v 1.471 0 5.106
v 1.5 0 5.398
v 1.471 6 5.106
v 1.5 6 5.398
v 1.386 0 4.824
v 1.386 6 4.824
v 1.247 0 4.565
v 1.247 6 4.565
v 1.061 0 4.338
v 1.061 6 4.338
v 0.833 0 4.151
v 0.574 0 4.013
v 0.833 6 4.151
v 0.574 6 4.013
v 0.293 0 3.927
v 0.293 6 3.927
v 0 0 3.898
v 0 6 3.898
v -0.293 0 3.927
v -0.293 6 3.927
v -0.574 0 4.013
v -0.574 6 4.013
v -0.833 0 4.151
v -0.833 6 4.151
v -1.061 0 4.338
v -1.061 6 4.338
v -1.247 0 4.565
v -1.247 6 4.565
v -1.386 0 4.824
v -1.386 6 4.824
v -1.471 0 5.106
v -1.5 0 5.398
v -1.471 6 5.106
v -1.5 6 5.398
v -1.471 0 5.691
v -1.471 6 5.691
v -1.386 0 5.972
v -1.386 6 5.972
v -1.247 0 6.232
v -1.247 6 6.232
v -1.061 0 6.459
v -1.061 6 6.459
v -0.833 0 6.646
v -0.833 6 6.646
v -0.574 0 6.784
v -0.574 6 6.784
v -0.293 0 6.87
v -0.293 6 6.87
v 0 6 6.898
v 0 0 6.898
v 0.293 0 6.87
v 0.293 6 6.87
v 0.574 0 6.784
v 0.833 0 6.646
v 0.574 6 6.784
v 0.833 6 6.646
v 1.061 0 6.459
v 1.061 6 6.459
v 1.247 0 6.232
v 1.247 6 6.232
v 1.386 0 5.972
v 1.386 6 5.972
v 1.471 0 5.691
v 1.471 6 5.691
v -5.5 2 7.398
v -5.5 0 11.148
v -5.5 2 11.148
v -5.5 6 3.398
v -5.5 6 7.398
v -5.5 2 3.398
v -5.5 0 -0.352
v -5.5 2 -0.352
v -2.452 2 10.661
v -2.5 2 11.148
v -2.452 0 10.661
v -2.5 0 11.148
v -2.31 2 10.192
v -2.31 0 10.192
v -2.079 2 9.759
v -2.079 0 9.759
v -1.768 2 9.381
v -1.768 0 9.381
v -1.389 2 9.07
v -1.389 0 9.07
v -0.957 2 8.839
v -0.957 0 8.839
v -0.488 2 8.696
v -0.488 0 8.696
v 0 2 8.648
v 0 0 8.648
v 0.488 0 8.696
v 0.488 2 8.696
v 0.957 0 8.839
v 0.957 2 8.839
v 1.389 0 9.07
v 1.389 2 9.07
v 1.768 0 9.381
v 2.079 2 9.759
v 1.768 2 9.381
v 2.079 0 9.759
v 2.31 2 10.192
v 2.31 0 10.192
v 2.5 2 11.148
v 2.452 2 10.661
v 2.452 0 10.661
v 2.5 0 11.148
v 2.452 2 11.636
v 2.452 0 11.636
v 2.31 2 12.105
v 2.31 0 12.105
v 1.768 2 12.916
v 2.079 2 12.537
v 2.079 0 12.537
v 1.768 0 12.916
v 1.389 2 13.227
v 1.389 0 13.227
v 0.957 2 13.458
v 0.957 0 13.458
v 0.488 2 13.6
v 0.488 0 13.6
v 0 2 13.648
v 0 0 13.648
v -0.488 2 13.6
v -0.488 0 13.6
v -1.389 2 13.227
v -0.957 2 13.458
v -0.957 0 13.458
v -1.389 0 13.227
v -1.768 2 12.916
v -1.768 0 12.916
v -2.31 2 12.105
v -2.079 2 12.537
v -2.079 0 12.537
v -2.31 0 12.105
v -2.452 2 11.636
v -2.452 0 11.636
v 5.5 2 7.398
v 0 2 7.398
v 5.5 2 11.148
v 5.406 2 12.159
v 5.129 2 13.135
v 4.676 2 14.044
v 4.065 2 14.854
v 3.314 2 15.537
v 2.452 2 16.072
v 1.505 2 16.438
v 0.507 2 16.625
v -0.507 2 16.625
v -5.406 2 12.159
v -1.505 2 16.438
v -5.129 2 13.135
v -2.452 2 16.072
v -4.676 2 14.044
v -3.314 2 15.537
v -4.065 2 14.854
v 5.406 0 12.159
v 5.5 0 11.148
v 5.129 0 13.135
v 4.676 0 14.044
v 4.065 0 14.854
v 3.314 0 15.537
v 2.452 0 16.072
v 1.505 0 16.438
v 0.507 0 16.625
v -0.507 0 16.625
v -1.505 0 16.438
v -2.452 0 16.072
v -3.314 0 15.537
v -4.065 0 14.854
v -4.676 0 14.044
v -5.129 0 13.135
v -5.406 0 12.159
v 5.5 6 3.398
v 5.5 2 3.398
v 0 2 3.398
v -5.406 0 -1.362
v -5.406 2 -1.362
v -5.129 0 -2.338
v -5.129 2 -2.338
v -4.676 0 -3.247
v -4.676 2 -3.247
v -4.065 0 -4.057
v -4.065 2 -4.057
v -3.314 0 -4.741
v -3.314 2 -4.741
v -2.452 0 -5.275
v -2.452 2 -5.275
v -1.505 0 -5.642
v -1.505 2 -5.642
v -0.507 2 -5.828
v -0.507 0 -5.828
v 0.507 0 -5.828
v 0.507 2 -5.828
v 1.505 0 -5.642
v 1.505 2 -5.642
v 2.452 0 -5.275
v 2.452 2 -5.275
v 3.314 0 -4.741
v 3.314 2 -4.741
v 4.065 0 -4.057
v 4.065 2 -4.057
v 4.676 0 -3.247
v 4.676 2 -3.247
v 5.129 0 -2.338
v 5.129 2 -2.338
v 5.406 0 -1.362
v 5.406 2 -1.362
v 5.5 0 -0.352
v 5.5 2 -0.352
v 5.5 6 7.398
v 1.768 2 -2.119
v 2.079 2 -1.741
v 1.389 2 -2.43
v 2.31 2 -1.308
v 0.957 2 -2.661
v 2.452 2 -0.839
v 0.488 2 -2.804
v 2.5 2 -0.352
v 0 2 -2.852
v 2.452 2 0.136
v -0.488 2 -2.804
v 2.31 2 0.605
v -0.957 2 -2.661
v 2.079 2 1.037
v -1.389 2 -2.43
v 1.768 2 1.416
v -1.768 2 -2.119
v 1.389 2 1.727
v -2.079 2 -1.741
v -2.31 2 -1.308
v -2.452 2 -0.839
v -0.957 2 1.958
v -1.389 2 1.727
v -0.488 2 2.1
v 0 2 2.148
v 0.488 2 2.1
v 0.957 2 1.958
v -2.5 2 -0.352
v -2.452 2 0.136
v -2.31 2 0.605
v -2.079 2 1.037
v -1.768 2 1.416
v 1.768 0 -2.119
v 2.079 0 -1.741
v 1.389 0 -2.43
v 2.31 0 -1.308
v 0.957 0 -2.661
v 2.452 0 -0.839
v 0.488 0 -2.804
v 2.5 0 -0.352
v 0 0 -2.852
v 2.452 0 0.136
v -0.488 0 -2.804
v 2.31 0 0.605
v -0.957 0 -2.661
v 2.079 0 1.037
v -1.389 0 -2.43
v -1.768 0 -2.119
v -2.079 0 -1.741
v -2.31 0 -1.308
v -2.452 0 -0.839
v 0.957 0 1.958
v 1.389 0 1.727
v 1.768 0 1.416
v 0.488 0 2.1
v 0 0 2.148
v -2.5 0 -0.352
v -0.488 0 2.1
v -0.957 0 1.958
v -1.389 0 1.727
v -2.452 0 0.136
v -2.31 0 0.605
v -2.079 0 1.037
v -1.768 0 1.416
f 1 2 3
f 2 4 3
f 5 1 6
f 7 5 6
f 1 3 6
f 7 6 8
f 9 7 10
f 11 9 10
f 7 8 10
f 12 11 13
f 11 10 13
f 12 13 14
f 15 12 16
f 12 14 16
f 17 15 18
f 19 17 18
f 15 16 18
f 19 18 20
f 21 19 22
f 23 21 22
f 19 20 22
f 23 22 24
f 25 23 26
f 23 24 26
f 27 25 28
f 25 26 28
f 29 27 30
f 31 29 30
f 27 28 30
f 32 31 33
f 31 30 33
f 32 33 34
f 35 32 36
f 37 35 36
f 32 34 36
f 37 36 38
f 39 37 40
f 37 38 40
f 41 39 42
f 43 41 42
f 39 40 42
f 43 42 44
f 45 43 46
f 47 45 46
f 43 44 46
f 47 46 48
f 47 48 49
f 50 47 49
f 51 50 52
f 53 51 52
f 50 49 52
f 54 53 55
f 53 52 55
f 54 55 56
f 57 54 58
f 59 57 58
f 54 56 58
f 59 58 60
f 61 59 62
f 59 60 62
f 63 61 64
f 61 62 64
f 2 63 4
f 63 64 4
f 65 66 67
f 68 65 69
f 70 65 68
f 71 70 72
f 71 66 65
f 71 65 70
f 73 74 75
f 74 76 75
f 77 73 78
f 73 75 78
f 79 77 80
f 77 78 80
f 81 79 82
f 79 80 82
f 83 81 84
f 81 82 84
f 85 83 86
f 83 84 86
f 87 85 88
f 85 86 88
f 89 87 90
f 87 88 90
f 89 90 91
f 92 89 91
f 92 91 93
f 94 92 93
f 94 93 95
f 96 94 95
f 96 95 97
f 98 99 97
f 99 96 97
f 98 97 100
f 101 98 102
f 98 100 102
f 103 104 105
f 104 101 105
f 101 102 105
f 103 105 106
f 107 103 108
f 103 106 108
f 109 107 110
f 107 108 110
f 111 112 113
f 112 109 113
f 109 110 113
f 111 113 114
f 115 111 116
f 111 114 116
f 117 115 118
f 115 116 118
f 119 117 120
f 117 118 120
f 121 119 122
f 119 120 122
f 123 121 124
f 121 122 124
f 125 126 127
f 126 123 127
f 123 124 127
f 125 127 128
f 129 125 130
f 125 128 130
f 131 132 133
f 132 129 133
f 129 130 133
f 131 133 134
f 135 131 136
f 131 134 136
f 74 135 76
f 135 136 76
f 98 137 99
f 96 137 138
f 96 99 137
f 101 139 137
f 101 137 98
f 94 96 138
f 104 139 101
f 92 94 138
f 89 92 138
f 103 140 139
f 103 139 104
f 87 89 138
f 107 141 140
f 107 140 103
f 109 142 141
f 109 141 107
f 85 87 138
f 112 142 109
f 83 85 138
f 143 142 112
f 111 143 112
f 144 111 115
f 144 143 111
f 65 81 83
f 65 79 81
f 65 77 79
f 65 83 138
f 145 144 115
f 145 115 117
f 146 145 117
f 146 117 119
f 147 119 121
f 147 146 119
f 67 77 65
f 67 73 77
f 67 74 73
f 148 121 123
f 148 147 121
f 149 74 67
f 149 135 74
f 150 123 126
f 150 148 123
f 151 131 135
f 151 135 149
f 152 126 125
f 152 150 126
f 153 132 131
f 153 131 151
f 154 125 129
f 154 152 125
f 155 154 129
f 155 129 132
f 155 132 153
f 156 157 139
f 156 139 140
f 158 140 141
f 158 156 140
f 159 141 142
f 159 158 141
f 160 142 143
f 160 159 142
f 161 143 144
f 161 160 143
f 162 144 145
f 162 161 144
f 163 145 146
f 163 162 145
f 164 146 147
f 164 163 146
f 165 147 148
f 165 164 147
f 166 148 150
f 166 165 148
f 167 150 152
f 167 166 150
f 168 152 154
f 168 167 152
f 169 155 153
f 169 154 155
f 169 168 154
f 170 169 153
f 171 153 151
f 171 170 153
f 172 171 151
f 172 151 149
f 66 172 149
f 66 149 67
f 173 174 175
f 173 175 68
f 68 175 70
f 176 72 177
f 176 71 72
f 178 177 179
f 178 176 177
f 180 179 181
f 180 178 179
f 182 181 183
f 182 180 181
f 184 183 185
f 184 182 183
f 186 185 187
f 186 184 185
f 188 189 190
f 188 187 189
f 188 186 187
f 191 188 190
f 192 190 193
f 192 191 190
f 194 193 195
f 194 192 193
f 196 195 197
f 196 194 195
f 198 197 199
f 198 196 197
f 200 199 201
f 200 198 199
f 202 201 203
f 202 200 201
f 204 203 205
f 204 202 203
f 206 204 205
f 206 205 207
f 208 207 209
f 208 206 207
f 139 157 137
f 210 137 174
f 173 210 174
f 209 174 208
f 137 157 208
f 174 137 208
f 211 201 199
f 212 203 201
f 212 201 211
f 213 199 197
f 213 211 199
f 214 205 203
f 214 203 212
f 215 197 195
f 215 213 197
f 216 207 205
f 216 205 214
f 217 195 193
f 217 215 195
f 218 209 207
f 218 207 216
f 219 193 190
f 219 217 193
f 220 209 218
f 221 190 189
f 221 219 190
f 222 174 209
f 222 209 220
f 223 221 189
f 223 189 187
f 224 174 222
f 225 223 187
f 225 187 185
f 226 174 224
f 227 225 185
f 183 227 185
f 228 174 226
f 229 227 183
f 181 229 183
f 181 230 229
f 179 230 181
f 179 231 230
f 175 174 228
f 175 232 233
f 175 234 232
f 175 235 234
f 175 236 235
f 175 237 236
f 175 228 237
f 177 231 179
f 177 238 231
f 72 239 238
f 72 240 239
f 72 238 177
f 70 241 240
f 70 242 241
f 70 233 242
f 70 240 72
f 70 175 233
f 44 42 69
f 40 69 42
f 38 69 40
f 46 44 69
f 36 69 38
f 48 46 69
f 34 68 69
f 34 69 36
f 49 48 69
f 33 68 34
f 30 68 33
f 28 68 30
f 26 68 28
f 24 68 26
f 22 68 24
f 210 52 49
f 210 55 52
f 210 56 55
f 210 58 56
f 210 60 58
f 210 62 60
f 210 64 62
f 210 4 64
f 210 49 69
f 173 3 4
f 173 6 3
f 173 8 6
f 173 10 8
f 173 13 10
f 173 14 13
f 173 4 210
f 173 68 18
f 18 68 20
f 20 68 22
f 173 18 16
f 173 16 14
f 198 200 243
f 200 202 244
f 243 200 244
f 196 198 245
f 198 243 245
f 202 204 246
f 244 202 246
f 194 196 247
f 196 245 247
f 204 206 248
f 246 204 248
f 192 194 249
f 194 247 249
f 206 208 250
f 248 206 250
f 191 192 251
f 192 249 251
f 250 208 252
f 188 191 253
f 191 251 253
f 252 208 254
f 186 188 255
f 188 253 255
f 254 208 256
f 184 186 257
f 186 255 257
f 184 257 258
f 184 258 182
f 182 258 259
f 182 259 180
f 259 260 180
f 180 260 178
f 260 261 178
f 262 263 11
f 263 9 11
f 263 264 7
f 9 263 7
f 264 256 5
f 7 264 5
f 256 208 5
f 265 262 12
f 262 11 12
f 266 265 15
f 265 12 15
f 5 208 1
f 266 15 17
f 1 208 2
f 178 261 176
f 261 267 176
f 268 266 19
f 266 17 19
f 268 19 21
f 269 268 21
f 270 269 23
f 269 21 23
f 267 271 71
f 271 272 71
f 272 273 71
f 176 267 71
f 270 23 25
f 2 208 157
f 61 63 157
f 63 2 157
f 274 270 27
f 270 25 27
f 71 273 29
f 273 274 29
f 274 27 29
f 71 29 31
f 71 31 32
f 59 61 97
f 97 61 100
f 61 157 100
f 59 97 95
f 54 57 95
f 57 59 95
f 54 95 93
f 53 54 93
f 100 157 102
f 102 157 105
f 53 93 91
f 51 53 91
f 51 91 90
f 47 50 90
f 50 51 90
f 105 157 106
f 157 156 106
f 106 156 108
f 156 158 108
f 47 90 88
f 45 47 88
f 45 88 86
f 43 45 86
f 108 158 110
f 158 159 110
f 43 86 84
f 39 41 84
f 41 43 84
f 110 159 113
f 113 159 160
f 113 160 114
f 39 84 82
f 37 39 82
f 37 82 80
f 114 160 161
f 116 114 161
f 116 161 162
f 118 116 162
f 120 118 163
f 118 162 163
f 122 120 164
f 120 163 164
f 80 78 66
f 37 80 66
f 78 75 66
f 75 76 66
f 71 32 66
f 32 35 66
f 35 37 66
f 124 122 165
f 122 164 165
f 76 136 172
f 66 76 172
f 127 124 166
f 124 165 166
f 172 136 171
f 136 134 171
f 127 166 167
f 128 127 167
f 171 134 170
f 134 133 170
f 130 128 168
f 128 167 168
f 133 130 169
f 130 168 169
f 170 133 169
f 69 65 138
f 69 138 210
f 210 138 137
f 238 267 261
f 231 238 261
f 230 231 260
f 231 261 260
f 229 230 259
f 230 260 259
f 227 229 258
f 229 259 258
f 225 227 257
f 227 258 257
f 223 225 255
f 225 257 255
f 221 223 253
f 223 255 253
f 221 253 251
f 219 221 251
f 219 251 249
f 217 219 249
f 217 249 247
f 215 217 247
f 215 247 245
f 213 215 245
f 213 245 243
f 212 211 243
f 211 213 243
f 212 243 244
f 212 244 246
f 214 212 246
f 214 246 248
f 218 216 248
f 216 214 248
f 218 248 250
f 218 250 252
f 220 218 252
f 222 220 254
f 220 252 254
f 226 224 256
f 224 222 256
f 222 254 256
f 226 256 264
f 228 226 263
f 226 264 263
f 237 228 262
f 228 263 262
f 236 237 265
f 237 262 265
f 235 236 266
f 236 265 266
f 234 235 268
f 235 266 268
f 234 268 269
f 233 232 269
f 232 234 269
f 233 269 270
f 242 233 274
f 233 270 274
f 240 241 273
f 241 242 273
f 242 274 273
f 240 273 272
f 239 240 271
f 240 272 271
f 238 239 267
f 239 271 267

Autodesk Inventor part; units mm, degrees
ref_plane "YZ Plane" through (0, 0, 0) normal (1, 0, 0) x (0, 1, 0)
ref_plane "XZ Plane" through (0, 0, 0) normal (0, 1, 0) x (-1, 0, 0)
ref_plane "XY Plane" through (0, 0, 0) normal (0, 0, 1) x (1, 0, 0)
sketch "Sketch1" plane through (0, 0, 0) normal (0, 1, 0) x (-1, 0, 0)
  circle A0 centre (0, 11.1484) radius 5.5
  line L0 (0, 11.1484) -> (0, -0.3516)
  circle A1 centre (0, -0.3516) radius 5.5
  circle A2 centre (0, 11.1484) radius 2.5
  circle A3 centre (0, -0.3516) radius 2.5
  line L1 (5.5, 11.1484) -> (5.5, -0.3516)
  line L2 (-5.5, 11.1484) -> (-5.5, -0.3516)
  point P0 (0, 0)
  dimension "d0" = 11
  dimension "d1" = 11.5
  dimension "d2" = 11
  dimension "d3" = 5
  dimension "d4" = 5
extrude "Extrusion1" add sketch "Sketch1" along normal blind 2
sketch "Sketch2" plane through (0, 2, 0) normal (0, 1, 0) x (1, 0, 0)
  circle A0 centre (0, -11.1484) radius 2.5 projected
  line L0 (0, -8.6484) -> (0, -2.1484)
  circle A1 centre (0, 0.3516) radius 2.5 projected
  line L1 (-5.5, 0.3516) -> (-5.5, -11.1484) projected
  line L2 (5.5, -3.3984) -> (-5.5, -3.3984)
  line L3 (-5.5, -3.3984) -> (-5.5, -7.3984)
  line L4 (-5.5, -7.3984) -> (5.5, -7.3984)
  line L5 (5.5, -7.3984) -> (5.5, -3.3984)
  line L6 (5.5, -3.3984) -> (-5.5, -7.3984) construction
  line L7 (-5.5, -3.3984) -> (5.5, -7.3984) construction
  point P0 (0, 0)
  point P1 (0, -5.3984)
  dimension "d7" = 4
extrude "Extrusion2" add sketch "Sketch2" along normal blind 4 contours L4 L1 L2 L0 | L0 L2 L5 L4
sketch "Sketch3" plane through (0, 6, 0) normal (0, 1, 0) x (1, 0, 0)
  line L0 (5.5, -3.3984) -> (-5.5, -3.3984) projected
  line L1 (-5.5, -3.3984) -> (-5.5, -7.3984) projected
  line L2 (-5.5, -7.3984) -> (5.5, -7.3984) projected
  line L3 (5.5, -7.3984) -> (5.5, -3.3984) projected
  circle A0 centre (0, -5.3984) radius 1.5
  point P0 (0, 0)
  dimension "d14" = 3
extrude "Extrusion3" cut sketch "Sketch3" against normal blind 16.6375 contours A0
properties part number "bearing plate"
